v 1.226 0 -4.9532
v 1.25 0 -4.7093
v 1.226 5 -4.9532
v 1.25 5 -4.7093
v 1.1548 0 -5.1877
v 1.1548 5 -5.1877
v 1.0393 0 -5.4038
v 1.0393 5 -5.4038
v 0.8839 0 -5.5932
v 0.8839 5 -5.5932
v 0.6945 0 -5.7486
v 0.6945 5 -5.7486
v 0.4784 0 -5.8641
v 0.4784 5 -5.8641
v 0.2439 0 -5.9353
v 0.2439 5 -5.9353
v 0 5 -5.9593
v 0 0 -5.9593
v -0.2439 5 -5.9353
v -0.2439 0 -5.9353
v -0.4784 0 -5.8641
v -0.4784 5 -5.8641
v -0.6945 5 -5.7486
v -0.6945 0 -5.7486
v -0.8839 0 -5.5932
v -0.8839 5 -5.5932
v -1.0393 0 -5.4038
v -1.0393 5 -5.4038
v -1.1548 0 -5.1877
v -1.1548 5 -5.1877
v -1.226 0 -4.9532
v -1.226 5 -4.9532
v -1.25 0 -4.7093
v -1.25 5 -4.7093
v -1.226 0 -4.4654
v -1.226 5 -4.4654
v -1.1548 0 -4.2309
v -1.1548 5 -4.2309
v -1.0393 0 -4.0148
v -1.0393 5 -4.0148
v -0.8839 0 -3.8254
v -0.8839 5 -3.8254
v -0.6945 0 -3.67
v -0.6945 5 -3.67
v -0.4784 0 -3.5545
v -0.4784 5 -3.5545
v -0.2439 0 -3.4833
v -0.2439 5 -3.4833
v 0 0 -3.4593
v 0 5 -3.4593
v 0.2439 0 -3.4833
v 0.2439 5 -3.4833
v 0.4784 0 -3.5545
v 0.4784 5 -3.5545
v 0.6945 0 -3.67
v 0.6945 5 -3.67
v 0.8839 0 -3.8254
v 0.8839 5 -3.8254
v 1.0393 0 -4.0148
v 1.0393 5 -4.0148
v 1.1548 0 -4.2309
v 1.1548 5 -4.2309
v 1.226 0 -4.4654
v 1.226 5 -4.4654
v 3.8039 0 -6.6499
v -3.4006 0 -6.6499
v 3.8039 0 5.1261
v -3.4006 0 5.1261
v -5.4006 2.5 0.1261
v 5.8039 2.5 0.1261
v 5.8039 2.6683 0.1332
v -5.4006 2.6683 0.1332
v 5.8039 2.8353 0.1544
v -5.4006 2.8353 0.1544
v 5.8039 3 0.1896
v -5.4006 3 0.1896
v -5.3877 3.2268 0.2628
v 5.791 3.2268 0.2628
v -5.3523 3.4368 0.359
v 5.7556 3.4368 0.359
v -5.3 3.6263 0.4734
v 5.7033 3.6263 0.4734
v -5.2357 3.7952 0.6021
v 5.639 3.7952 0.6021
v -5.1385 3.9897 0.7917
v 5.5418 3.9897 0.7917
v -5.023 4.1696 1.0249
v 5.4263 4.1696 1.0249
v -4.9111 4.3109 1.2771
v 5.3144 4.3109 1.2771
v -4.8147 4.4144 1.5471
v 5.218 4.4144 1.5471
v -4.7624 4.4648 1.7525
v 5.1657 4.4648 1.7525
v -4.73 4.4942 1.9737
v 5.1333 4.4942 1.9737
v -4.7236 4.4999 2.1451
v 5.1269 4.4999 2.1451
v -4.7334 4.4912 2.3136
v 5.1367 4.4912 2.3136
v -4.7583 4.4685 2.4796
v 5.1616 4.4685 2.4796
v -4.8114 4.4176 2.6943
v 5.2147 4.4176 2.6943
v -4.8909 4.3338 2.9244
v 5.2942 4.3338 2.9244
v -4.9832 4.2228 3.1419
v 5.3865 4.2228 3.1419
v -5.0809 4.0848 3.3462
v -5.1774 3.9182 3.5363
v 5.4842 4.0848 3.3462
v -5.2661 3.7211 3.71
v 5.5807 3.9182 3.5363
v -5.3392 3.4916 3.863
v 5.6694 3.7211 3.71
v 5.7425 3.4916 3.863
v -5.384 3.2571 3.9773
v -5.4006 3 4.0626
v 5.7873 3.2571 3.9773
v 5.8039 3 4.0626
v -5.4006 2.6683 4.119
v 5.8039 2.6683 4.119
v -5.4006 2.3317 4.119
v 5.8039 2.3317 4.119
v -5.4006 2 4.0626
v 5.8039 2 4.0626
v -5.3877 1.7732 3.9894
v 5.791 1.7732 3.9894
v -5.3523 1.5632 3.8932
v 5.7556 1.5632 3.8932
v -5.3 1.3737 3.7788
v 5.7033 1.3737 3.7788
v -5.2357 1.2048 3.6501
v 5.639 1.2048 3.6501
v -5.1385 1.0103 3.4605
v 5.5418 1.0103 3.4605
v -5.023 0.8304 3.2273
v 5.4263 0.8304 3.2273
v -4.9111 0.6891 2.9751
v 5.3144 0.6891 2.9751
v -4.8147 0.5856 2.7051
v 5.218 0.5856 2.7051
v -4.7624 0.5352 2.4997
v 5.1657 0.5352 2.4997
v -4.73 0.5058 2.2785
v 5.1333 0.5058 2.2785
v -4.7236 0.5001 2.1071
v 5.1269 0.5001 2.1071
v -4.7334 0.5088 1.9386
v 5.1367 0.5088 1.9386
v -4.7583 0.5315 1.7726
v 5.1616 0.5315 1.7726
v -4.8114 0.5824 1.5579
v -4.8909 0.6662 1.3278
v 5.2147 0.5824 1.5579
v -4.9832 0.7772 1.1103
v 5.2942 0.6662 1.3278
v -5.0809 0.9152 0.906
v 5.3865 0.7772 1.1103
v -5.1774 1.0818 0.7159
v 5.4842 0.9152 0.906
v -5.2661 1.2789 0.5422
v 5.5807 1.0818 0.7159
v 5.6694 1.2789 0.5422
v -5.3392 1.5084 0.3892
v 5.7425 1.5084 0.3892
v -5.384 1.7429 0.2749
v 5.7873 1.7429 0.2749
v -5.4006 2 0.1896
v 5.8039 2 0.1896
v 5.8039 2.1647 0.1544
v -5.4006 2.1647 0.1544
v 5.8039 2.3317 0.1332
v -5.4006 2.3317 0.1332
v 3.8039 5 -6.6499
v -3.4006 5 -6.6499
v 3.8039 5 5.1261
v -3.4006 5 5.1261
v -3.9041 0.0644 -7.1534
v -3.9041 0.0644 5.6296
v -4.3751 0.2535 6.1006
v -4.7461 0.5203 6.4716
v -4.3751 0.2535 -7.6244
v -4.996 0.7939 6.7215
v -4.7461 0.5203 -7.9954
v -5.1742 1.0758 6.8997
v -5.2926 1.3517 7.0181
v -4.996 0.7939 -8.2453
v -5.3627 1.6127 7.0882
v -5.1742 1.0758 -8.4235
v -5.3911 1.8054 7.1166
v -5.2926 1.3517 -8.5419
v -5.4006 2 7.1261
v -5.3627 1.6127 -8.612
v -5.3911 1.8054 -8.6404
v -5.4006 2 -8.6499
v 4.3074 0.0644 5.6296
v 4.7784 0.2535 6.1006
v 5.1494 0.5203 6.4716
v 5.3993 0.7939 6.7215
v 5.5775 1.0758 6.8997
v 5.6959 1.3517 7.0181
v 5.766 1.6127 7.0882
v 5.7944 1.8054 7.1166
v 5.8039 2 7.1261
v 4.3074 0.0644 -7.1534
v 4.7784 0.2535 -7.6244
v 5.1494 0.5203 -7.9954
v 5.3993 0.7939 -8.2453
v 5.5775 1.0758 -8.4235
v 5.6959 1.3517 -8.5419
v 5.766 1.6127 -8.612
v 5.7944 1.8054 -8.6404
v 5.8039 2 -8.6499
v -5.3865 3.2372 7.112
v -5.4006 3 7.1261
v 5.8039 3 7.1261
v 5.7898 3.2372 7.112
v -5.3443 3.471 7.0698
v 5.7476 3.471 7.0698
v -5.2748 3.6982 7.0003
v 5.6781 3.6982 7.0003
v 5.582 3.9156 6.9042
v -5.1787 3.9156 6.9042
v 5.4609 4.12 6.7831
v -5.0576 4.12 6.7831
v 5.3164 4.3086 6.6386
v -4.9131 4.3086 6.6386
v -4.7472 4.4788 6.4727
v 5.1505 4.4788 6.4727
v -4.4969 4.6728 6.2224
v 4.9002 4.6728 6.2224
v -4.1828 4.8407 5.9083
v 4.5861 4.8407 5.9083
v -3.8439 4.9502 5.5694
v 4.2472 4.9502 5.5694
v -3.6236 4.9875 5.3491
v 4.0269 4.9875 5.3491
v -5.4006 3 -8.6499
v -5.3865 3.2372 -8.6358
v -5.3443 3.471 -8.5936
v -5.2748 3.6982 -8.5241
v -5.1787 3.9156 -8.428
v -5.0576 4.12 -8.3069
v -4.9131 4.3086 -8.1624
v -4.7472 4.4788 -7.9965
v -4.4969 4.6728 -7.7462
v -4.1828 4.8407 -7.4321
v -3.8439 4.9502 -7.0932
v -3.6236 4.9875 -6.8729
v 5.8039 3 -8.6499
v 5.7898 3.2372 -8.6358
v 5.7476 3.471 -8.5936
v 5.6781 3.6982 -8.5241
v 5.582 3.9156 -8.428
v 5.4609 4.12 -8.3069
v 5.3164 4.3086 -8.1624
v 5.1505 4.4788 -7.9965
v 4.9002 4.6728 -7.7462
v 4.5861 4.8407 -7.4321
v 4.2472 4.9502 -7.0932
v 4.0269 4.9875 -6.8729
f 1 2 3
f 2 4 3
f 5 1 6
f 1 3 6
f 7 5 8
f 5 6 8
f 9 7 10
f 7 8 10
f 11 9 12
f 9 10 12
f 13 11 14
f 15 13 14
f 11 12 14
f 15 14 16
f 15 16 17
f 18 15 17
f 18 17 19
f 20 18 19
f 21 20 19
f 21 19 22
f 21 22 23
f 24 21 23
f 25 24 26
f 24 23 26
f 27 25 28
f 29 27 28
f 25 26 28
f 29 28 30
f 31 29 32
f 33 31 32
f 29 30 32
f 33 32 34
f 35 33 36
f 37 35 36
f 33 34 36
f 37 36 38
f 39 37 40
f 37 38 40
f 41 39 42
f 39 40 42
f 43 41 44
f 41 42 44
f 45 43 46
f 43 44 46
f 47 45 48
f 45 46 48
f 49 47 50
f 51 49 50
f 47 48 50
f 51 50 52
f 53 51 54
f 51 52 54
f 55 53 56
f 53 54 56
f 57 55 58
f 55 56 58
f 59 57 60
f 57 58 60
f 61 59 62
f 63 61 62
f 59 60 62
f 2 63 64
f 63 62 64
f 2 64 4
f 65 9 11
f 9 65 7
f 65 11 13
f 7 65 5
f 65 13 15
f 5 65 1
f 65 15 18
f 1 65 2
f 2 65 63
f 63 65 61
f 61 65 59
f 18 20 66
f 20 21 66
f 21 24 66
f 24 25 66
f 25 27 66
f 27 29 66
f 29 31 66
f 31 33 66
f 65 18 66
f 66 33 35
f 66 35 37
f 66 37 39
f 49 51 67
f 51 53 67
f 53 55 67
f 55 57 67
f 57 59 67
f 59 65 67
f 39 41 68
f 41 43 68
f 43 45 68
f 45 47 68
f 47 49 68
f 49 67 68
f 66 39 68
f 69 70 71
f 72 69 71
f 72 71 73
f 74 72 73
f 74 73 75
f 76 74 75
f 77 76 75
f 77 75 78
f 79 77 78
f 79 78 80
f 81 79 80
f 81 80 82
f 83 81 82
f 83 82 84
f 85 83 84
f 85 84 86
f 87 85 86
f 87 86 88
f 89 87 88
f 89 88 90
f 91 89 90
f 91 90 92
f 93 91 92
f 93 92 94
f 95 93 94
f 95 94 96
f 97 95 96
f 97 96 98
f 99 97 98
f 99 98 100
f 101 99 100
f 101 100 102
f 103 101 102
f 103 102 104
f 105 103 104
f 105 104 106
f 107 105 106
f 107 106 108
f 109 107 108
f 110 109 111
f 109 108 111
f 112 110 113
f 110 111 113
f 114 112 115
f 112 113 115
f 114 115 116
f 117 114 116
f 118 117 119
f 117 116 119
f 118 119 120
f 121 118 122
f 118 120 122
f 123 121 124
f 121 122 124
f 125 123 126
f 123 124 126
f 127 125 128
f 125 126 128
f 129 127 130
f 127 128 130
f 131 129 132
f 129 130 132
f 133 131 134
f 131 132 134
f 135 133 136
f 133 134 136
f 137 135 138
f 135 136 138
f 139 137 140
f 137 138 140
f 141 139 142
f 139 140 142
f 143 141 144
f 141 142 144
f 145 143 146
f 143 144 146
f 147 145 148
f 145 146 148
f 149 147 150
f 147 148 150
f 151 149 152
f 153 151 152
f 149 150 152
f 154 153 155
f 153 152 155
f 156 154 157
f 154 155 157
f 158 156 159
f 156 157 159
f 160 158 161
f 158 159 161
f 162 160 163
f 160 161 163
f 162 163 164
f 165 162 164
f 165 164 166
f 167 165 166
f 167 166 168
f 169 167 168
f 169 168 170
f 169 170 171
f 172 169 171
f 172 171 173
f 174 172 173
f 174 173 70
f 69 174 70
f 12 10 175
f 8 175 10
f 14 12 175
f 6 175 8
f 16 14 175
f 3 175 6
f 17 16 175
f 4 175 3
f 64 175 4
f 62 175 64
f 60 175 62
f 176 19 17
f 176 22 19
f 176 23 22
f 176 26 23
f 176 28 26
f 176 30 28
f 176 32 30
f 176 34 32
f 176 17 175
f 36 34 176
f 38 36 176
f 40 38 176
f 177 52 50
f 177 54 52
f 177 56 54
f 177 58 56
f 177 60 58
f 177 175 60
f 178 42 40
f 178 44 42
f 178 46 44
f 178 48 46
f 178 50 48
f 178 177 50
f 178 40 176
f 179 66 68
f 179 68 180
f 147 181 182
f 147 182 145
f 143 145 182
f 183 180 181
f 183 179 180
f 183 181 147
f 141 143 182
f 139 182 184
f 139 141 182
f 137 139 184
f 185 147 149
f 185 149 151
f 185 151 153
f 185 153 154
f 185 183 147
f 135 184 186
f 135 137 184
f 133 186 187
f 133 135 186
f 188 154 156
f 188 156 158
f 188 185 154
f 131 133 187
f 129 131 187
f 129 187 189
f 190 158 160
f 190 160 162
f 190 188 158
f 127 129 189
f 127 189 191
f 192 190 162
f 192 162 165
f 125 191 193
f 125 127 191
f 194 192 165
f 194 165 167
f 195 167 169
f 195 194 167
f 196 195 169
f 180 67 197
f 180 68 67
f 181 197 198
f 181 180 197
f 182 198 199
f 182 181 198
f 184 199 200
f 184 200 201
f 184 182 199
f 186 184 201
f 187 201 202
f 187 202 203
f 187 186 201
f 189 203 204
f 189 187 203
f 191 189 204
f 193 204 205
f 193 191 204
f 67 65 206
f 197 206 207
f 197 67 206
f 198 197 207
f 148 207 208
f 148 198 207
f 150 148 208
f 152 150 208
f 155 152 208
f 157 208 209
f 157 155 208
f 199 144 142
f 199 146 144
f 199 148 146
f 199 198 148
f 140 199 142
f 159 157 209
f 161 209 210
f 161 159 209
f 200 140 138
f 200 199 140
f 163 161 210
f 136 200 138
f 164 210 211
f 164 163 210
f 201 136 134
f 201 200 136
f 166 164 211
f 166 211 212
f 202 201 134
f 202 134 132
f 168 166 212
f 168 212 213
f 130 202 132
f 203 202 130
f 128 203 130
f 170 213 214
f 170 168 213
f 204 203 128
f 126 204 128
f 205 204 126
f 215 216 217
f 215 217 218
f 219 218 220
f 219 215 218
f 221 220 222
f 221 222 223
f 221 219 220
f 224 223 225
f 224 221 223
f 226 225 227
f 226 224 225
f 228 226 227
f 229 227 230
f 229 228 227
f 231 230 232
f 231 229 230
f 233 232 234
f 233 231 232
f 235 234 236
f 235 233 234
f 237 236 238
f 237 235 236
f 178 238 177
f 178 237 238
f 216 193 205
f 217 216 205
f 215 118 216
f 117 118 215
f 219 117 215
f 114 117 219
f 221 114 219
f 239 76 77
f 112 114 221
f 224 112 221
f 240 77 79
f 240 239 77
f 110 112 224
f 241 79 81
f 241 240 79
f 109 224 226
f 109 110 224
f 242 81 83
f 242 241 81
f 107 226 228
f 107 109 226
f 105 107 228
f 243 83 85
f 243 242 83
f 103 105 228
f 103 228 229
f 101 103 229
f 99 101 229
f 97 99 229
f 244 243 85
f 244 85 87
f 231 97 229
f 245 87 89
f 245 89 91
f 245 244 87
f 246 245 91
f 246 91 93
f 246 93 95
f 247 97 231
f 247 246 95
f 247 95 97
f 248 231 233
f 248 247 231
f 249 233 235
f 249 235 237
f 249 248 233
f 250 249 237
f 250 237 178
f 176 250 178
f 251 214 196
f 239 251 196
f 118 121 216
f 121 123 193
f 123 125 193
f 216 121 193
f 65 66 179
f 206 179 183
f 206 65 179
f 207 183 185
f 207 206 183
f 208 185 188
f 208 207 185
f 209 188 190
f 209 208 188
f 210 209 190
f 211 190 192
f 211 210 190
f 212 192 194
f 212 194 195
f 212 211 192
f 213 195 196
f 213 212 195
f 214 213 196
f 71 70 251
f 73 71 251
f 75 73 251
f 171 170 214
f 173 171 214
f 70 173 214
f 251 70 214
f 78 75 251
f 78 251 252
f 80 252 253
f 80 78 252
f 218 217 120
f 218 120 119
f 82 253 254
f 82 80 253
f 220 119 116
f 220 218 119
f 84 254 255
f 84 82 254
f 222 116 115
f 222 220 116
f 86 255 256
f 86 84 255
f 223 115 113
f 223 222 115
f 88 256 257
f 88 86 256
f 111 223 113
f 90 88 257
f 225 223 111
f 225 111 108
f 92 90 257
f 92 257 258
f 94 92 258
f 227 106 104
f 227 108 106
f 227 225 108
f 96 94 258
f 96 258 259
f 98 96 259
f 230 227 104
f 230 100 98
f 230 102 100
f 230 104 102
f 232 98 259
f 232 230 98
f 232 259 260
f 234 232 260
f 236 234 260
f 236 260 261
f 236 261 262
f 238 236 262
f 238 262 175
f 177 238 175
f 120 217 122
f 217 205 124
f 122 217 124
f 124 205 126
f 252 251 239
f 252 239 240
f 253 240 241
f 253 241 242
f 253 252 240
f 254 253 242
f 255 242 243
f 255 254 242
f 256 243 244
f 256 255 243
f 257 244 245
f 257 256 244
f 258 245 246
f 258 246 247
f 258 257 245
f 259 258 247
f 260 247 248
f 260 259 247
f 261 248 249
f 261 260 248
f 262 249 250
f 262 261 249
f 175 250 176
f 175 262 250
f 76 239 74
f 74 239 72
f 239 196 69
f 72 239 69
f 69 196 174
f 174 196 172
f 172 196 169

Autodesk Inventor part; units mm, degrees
ref_plane "YZ Plane" through (0, 0, 0) normal (1, 0, 0) x (0, 1, 0)
ref_plane "XZ Plane" through (0, 0, 0) normal (0, 1, 0) x (-1, 0, 0)
ref_plane "XY Plane" through (0, 0, 0) normal (0, 0, 1) x (1, 0, 0)
sketch "Sketch1" plane through (0, 0, 0) normal (0, 1, 0) x (-1, 0, 0)
  line L0 (5.4006, 7.1261) -> (-5.8039, 7.1261)
  line L1 (-5.8039, 7.1261) -> (-5.8039, -8.6499)
  line L2 (-5.8039, -8.6499) -> (5.4006, -8.6499)
  line L3 (5.4006, -8.6499) -> (5.4006, 7.1261)
  point P0 (0, 0)
extrude "Extrusion1" add sketch "Sketch1" along normal blind 5
sketch "Sketch2" plane through (5.8039, 0, 7.1261) normal (1, 0, 0) x (0, 0, -1)
  line L0 (0, 5) -> (15.7759, 5) projected
  circle A0 centre (5, 2.5) radius 2
  line L1 (0, 0) -> (0, 5) projected
  point P0 (7.1261, 0)
  dimension "d6" = 4
  dimension "d7" = 5
extrude "Extrusion2" cut sketch "Sketch2" against normal through all
fillet "Fillet1" radius 2 8 edges at (0.2017, 5, 7.1261) (0.2017, 0, 7.1261) (-5.4006, 5, -0.7619) (0.2017, 5, -8.6499) (0.2017, 0, -8.6499) (5.8039, 0, -0.7619) (5.8039, 5, -0.7619) (-5.4006, 0, -0.7619)
sketch "Sketch3" plane through (0, 5, 0) normal (0, 1, 0) x (1, 0, 0)
  circle A0 centre (0, 4.7093) radius 1.25
  point P0 (0, 0)
  dimension "d9" = 2.5
extrude "Extrusion3" cut sketch "Sketch3" against normal through all
properties part number "hands"
